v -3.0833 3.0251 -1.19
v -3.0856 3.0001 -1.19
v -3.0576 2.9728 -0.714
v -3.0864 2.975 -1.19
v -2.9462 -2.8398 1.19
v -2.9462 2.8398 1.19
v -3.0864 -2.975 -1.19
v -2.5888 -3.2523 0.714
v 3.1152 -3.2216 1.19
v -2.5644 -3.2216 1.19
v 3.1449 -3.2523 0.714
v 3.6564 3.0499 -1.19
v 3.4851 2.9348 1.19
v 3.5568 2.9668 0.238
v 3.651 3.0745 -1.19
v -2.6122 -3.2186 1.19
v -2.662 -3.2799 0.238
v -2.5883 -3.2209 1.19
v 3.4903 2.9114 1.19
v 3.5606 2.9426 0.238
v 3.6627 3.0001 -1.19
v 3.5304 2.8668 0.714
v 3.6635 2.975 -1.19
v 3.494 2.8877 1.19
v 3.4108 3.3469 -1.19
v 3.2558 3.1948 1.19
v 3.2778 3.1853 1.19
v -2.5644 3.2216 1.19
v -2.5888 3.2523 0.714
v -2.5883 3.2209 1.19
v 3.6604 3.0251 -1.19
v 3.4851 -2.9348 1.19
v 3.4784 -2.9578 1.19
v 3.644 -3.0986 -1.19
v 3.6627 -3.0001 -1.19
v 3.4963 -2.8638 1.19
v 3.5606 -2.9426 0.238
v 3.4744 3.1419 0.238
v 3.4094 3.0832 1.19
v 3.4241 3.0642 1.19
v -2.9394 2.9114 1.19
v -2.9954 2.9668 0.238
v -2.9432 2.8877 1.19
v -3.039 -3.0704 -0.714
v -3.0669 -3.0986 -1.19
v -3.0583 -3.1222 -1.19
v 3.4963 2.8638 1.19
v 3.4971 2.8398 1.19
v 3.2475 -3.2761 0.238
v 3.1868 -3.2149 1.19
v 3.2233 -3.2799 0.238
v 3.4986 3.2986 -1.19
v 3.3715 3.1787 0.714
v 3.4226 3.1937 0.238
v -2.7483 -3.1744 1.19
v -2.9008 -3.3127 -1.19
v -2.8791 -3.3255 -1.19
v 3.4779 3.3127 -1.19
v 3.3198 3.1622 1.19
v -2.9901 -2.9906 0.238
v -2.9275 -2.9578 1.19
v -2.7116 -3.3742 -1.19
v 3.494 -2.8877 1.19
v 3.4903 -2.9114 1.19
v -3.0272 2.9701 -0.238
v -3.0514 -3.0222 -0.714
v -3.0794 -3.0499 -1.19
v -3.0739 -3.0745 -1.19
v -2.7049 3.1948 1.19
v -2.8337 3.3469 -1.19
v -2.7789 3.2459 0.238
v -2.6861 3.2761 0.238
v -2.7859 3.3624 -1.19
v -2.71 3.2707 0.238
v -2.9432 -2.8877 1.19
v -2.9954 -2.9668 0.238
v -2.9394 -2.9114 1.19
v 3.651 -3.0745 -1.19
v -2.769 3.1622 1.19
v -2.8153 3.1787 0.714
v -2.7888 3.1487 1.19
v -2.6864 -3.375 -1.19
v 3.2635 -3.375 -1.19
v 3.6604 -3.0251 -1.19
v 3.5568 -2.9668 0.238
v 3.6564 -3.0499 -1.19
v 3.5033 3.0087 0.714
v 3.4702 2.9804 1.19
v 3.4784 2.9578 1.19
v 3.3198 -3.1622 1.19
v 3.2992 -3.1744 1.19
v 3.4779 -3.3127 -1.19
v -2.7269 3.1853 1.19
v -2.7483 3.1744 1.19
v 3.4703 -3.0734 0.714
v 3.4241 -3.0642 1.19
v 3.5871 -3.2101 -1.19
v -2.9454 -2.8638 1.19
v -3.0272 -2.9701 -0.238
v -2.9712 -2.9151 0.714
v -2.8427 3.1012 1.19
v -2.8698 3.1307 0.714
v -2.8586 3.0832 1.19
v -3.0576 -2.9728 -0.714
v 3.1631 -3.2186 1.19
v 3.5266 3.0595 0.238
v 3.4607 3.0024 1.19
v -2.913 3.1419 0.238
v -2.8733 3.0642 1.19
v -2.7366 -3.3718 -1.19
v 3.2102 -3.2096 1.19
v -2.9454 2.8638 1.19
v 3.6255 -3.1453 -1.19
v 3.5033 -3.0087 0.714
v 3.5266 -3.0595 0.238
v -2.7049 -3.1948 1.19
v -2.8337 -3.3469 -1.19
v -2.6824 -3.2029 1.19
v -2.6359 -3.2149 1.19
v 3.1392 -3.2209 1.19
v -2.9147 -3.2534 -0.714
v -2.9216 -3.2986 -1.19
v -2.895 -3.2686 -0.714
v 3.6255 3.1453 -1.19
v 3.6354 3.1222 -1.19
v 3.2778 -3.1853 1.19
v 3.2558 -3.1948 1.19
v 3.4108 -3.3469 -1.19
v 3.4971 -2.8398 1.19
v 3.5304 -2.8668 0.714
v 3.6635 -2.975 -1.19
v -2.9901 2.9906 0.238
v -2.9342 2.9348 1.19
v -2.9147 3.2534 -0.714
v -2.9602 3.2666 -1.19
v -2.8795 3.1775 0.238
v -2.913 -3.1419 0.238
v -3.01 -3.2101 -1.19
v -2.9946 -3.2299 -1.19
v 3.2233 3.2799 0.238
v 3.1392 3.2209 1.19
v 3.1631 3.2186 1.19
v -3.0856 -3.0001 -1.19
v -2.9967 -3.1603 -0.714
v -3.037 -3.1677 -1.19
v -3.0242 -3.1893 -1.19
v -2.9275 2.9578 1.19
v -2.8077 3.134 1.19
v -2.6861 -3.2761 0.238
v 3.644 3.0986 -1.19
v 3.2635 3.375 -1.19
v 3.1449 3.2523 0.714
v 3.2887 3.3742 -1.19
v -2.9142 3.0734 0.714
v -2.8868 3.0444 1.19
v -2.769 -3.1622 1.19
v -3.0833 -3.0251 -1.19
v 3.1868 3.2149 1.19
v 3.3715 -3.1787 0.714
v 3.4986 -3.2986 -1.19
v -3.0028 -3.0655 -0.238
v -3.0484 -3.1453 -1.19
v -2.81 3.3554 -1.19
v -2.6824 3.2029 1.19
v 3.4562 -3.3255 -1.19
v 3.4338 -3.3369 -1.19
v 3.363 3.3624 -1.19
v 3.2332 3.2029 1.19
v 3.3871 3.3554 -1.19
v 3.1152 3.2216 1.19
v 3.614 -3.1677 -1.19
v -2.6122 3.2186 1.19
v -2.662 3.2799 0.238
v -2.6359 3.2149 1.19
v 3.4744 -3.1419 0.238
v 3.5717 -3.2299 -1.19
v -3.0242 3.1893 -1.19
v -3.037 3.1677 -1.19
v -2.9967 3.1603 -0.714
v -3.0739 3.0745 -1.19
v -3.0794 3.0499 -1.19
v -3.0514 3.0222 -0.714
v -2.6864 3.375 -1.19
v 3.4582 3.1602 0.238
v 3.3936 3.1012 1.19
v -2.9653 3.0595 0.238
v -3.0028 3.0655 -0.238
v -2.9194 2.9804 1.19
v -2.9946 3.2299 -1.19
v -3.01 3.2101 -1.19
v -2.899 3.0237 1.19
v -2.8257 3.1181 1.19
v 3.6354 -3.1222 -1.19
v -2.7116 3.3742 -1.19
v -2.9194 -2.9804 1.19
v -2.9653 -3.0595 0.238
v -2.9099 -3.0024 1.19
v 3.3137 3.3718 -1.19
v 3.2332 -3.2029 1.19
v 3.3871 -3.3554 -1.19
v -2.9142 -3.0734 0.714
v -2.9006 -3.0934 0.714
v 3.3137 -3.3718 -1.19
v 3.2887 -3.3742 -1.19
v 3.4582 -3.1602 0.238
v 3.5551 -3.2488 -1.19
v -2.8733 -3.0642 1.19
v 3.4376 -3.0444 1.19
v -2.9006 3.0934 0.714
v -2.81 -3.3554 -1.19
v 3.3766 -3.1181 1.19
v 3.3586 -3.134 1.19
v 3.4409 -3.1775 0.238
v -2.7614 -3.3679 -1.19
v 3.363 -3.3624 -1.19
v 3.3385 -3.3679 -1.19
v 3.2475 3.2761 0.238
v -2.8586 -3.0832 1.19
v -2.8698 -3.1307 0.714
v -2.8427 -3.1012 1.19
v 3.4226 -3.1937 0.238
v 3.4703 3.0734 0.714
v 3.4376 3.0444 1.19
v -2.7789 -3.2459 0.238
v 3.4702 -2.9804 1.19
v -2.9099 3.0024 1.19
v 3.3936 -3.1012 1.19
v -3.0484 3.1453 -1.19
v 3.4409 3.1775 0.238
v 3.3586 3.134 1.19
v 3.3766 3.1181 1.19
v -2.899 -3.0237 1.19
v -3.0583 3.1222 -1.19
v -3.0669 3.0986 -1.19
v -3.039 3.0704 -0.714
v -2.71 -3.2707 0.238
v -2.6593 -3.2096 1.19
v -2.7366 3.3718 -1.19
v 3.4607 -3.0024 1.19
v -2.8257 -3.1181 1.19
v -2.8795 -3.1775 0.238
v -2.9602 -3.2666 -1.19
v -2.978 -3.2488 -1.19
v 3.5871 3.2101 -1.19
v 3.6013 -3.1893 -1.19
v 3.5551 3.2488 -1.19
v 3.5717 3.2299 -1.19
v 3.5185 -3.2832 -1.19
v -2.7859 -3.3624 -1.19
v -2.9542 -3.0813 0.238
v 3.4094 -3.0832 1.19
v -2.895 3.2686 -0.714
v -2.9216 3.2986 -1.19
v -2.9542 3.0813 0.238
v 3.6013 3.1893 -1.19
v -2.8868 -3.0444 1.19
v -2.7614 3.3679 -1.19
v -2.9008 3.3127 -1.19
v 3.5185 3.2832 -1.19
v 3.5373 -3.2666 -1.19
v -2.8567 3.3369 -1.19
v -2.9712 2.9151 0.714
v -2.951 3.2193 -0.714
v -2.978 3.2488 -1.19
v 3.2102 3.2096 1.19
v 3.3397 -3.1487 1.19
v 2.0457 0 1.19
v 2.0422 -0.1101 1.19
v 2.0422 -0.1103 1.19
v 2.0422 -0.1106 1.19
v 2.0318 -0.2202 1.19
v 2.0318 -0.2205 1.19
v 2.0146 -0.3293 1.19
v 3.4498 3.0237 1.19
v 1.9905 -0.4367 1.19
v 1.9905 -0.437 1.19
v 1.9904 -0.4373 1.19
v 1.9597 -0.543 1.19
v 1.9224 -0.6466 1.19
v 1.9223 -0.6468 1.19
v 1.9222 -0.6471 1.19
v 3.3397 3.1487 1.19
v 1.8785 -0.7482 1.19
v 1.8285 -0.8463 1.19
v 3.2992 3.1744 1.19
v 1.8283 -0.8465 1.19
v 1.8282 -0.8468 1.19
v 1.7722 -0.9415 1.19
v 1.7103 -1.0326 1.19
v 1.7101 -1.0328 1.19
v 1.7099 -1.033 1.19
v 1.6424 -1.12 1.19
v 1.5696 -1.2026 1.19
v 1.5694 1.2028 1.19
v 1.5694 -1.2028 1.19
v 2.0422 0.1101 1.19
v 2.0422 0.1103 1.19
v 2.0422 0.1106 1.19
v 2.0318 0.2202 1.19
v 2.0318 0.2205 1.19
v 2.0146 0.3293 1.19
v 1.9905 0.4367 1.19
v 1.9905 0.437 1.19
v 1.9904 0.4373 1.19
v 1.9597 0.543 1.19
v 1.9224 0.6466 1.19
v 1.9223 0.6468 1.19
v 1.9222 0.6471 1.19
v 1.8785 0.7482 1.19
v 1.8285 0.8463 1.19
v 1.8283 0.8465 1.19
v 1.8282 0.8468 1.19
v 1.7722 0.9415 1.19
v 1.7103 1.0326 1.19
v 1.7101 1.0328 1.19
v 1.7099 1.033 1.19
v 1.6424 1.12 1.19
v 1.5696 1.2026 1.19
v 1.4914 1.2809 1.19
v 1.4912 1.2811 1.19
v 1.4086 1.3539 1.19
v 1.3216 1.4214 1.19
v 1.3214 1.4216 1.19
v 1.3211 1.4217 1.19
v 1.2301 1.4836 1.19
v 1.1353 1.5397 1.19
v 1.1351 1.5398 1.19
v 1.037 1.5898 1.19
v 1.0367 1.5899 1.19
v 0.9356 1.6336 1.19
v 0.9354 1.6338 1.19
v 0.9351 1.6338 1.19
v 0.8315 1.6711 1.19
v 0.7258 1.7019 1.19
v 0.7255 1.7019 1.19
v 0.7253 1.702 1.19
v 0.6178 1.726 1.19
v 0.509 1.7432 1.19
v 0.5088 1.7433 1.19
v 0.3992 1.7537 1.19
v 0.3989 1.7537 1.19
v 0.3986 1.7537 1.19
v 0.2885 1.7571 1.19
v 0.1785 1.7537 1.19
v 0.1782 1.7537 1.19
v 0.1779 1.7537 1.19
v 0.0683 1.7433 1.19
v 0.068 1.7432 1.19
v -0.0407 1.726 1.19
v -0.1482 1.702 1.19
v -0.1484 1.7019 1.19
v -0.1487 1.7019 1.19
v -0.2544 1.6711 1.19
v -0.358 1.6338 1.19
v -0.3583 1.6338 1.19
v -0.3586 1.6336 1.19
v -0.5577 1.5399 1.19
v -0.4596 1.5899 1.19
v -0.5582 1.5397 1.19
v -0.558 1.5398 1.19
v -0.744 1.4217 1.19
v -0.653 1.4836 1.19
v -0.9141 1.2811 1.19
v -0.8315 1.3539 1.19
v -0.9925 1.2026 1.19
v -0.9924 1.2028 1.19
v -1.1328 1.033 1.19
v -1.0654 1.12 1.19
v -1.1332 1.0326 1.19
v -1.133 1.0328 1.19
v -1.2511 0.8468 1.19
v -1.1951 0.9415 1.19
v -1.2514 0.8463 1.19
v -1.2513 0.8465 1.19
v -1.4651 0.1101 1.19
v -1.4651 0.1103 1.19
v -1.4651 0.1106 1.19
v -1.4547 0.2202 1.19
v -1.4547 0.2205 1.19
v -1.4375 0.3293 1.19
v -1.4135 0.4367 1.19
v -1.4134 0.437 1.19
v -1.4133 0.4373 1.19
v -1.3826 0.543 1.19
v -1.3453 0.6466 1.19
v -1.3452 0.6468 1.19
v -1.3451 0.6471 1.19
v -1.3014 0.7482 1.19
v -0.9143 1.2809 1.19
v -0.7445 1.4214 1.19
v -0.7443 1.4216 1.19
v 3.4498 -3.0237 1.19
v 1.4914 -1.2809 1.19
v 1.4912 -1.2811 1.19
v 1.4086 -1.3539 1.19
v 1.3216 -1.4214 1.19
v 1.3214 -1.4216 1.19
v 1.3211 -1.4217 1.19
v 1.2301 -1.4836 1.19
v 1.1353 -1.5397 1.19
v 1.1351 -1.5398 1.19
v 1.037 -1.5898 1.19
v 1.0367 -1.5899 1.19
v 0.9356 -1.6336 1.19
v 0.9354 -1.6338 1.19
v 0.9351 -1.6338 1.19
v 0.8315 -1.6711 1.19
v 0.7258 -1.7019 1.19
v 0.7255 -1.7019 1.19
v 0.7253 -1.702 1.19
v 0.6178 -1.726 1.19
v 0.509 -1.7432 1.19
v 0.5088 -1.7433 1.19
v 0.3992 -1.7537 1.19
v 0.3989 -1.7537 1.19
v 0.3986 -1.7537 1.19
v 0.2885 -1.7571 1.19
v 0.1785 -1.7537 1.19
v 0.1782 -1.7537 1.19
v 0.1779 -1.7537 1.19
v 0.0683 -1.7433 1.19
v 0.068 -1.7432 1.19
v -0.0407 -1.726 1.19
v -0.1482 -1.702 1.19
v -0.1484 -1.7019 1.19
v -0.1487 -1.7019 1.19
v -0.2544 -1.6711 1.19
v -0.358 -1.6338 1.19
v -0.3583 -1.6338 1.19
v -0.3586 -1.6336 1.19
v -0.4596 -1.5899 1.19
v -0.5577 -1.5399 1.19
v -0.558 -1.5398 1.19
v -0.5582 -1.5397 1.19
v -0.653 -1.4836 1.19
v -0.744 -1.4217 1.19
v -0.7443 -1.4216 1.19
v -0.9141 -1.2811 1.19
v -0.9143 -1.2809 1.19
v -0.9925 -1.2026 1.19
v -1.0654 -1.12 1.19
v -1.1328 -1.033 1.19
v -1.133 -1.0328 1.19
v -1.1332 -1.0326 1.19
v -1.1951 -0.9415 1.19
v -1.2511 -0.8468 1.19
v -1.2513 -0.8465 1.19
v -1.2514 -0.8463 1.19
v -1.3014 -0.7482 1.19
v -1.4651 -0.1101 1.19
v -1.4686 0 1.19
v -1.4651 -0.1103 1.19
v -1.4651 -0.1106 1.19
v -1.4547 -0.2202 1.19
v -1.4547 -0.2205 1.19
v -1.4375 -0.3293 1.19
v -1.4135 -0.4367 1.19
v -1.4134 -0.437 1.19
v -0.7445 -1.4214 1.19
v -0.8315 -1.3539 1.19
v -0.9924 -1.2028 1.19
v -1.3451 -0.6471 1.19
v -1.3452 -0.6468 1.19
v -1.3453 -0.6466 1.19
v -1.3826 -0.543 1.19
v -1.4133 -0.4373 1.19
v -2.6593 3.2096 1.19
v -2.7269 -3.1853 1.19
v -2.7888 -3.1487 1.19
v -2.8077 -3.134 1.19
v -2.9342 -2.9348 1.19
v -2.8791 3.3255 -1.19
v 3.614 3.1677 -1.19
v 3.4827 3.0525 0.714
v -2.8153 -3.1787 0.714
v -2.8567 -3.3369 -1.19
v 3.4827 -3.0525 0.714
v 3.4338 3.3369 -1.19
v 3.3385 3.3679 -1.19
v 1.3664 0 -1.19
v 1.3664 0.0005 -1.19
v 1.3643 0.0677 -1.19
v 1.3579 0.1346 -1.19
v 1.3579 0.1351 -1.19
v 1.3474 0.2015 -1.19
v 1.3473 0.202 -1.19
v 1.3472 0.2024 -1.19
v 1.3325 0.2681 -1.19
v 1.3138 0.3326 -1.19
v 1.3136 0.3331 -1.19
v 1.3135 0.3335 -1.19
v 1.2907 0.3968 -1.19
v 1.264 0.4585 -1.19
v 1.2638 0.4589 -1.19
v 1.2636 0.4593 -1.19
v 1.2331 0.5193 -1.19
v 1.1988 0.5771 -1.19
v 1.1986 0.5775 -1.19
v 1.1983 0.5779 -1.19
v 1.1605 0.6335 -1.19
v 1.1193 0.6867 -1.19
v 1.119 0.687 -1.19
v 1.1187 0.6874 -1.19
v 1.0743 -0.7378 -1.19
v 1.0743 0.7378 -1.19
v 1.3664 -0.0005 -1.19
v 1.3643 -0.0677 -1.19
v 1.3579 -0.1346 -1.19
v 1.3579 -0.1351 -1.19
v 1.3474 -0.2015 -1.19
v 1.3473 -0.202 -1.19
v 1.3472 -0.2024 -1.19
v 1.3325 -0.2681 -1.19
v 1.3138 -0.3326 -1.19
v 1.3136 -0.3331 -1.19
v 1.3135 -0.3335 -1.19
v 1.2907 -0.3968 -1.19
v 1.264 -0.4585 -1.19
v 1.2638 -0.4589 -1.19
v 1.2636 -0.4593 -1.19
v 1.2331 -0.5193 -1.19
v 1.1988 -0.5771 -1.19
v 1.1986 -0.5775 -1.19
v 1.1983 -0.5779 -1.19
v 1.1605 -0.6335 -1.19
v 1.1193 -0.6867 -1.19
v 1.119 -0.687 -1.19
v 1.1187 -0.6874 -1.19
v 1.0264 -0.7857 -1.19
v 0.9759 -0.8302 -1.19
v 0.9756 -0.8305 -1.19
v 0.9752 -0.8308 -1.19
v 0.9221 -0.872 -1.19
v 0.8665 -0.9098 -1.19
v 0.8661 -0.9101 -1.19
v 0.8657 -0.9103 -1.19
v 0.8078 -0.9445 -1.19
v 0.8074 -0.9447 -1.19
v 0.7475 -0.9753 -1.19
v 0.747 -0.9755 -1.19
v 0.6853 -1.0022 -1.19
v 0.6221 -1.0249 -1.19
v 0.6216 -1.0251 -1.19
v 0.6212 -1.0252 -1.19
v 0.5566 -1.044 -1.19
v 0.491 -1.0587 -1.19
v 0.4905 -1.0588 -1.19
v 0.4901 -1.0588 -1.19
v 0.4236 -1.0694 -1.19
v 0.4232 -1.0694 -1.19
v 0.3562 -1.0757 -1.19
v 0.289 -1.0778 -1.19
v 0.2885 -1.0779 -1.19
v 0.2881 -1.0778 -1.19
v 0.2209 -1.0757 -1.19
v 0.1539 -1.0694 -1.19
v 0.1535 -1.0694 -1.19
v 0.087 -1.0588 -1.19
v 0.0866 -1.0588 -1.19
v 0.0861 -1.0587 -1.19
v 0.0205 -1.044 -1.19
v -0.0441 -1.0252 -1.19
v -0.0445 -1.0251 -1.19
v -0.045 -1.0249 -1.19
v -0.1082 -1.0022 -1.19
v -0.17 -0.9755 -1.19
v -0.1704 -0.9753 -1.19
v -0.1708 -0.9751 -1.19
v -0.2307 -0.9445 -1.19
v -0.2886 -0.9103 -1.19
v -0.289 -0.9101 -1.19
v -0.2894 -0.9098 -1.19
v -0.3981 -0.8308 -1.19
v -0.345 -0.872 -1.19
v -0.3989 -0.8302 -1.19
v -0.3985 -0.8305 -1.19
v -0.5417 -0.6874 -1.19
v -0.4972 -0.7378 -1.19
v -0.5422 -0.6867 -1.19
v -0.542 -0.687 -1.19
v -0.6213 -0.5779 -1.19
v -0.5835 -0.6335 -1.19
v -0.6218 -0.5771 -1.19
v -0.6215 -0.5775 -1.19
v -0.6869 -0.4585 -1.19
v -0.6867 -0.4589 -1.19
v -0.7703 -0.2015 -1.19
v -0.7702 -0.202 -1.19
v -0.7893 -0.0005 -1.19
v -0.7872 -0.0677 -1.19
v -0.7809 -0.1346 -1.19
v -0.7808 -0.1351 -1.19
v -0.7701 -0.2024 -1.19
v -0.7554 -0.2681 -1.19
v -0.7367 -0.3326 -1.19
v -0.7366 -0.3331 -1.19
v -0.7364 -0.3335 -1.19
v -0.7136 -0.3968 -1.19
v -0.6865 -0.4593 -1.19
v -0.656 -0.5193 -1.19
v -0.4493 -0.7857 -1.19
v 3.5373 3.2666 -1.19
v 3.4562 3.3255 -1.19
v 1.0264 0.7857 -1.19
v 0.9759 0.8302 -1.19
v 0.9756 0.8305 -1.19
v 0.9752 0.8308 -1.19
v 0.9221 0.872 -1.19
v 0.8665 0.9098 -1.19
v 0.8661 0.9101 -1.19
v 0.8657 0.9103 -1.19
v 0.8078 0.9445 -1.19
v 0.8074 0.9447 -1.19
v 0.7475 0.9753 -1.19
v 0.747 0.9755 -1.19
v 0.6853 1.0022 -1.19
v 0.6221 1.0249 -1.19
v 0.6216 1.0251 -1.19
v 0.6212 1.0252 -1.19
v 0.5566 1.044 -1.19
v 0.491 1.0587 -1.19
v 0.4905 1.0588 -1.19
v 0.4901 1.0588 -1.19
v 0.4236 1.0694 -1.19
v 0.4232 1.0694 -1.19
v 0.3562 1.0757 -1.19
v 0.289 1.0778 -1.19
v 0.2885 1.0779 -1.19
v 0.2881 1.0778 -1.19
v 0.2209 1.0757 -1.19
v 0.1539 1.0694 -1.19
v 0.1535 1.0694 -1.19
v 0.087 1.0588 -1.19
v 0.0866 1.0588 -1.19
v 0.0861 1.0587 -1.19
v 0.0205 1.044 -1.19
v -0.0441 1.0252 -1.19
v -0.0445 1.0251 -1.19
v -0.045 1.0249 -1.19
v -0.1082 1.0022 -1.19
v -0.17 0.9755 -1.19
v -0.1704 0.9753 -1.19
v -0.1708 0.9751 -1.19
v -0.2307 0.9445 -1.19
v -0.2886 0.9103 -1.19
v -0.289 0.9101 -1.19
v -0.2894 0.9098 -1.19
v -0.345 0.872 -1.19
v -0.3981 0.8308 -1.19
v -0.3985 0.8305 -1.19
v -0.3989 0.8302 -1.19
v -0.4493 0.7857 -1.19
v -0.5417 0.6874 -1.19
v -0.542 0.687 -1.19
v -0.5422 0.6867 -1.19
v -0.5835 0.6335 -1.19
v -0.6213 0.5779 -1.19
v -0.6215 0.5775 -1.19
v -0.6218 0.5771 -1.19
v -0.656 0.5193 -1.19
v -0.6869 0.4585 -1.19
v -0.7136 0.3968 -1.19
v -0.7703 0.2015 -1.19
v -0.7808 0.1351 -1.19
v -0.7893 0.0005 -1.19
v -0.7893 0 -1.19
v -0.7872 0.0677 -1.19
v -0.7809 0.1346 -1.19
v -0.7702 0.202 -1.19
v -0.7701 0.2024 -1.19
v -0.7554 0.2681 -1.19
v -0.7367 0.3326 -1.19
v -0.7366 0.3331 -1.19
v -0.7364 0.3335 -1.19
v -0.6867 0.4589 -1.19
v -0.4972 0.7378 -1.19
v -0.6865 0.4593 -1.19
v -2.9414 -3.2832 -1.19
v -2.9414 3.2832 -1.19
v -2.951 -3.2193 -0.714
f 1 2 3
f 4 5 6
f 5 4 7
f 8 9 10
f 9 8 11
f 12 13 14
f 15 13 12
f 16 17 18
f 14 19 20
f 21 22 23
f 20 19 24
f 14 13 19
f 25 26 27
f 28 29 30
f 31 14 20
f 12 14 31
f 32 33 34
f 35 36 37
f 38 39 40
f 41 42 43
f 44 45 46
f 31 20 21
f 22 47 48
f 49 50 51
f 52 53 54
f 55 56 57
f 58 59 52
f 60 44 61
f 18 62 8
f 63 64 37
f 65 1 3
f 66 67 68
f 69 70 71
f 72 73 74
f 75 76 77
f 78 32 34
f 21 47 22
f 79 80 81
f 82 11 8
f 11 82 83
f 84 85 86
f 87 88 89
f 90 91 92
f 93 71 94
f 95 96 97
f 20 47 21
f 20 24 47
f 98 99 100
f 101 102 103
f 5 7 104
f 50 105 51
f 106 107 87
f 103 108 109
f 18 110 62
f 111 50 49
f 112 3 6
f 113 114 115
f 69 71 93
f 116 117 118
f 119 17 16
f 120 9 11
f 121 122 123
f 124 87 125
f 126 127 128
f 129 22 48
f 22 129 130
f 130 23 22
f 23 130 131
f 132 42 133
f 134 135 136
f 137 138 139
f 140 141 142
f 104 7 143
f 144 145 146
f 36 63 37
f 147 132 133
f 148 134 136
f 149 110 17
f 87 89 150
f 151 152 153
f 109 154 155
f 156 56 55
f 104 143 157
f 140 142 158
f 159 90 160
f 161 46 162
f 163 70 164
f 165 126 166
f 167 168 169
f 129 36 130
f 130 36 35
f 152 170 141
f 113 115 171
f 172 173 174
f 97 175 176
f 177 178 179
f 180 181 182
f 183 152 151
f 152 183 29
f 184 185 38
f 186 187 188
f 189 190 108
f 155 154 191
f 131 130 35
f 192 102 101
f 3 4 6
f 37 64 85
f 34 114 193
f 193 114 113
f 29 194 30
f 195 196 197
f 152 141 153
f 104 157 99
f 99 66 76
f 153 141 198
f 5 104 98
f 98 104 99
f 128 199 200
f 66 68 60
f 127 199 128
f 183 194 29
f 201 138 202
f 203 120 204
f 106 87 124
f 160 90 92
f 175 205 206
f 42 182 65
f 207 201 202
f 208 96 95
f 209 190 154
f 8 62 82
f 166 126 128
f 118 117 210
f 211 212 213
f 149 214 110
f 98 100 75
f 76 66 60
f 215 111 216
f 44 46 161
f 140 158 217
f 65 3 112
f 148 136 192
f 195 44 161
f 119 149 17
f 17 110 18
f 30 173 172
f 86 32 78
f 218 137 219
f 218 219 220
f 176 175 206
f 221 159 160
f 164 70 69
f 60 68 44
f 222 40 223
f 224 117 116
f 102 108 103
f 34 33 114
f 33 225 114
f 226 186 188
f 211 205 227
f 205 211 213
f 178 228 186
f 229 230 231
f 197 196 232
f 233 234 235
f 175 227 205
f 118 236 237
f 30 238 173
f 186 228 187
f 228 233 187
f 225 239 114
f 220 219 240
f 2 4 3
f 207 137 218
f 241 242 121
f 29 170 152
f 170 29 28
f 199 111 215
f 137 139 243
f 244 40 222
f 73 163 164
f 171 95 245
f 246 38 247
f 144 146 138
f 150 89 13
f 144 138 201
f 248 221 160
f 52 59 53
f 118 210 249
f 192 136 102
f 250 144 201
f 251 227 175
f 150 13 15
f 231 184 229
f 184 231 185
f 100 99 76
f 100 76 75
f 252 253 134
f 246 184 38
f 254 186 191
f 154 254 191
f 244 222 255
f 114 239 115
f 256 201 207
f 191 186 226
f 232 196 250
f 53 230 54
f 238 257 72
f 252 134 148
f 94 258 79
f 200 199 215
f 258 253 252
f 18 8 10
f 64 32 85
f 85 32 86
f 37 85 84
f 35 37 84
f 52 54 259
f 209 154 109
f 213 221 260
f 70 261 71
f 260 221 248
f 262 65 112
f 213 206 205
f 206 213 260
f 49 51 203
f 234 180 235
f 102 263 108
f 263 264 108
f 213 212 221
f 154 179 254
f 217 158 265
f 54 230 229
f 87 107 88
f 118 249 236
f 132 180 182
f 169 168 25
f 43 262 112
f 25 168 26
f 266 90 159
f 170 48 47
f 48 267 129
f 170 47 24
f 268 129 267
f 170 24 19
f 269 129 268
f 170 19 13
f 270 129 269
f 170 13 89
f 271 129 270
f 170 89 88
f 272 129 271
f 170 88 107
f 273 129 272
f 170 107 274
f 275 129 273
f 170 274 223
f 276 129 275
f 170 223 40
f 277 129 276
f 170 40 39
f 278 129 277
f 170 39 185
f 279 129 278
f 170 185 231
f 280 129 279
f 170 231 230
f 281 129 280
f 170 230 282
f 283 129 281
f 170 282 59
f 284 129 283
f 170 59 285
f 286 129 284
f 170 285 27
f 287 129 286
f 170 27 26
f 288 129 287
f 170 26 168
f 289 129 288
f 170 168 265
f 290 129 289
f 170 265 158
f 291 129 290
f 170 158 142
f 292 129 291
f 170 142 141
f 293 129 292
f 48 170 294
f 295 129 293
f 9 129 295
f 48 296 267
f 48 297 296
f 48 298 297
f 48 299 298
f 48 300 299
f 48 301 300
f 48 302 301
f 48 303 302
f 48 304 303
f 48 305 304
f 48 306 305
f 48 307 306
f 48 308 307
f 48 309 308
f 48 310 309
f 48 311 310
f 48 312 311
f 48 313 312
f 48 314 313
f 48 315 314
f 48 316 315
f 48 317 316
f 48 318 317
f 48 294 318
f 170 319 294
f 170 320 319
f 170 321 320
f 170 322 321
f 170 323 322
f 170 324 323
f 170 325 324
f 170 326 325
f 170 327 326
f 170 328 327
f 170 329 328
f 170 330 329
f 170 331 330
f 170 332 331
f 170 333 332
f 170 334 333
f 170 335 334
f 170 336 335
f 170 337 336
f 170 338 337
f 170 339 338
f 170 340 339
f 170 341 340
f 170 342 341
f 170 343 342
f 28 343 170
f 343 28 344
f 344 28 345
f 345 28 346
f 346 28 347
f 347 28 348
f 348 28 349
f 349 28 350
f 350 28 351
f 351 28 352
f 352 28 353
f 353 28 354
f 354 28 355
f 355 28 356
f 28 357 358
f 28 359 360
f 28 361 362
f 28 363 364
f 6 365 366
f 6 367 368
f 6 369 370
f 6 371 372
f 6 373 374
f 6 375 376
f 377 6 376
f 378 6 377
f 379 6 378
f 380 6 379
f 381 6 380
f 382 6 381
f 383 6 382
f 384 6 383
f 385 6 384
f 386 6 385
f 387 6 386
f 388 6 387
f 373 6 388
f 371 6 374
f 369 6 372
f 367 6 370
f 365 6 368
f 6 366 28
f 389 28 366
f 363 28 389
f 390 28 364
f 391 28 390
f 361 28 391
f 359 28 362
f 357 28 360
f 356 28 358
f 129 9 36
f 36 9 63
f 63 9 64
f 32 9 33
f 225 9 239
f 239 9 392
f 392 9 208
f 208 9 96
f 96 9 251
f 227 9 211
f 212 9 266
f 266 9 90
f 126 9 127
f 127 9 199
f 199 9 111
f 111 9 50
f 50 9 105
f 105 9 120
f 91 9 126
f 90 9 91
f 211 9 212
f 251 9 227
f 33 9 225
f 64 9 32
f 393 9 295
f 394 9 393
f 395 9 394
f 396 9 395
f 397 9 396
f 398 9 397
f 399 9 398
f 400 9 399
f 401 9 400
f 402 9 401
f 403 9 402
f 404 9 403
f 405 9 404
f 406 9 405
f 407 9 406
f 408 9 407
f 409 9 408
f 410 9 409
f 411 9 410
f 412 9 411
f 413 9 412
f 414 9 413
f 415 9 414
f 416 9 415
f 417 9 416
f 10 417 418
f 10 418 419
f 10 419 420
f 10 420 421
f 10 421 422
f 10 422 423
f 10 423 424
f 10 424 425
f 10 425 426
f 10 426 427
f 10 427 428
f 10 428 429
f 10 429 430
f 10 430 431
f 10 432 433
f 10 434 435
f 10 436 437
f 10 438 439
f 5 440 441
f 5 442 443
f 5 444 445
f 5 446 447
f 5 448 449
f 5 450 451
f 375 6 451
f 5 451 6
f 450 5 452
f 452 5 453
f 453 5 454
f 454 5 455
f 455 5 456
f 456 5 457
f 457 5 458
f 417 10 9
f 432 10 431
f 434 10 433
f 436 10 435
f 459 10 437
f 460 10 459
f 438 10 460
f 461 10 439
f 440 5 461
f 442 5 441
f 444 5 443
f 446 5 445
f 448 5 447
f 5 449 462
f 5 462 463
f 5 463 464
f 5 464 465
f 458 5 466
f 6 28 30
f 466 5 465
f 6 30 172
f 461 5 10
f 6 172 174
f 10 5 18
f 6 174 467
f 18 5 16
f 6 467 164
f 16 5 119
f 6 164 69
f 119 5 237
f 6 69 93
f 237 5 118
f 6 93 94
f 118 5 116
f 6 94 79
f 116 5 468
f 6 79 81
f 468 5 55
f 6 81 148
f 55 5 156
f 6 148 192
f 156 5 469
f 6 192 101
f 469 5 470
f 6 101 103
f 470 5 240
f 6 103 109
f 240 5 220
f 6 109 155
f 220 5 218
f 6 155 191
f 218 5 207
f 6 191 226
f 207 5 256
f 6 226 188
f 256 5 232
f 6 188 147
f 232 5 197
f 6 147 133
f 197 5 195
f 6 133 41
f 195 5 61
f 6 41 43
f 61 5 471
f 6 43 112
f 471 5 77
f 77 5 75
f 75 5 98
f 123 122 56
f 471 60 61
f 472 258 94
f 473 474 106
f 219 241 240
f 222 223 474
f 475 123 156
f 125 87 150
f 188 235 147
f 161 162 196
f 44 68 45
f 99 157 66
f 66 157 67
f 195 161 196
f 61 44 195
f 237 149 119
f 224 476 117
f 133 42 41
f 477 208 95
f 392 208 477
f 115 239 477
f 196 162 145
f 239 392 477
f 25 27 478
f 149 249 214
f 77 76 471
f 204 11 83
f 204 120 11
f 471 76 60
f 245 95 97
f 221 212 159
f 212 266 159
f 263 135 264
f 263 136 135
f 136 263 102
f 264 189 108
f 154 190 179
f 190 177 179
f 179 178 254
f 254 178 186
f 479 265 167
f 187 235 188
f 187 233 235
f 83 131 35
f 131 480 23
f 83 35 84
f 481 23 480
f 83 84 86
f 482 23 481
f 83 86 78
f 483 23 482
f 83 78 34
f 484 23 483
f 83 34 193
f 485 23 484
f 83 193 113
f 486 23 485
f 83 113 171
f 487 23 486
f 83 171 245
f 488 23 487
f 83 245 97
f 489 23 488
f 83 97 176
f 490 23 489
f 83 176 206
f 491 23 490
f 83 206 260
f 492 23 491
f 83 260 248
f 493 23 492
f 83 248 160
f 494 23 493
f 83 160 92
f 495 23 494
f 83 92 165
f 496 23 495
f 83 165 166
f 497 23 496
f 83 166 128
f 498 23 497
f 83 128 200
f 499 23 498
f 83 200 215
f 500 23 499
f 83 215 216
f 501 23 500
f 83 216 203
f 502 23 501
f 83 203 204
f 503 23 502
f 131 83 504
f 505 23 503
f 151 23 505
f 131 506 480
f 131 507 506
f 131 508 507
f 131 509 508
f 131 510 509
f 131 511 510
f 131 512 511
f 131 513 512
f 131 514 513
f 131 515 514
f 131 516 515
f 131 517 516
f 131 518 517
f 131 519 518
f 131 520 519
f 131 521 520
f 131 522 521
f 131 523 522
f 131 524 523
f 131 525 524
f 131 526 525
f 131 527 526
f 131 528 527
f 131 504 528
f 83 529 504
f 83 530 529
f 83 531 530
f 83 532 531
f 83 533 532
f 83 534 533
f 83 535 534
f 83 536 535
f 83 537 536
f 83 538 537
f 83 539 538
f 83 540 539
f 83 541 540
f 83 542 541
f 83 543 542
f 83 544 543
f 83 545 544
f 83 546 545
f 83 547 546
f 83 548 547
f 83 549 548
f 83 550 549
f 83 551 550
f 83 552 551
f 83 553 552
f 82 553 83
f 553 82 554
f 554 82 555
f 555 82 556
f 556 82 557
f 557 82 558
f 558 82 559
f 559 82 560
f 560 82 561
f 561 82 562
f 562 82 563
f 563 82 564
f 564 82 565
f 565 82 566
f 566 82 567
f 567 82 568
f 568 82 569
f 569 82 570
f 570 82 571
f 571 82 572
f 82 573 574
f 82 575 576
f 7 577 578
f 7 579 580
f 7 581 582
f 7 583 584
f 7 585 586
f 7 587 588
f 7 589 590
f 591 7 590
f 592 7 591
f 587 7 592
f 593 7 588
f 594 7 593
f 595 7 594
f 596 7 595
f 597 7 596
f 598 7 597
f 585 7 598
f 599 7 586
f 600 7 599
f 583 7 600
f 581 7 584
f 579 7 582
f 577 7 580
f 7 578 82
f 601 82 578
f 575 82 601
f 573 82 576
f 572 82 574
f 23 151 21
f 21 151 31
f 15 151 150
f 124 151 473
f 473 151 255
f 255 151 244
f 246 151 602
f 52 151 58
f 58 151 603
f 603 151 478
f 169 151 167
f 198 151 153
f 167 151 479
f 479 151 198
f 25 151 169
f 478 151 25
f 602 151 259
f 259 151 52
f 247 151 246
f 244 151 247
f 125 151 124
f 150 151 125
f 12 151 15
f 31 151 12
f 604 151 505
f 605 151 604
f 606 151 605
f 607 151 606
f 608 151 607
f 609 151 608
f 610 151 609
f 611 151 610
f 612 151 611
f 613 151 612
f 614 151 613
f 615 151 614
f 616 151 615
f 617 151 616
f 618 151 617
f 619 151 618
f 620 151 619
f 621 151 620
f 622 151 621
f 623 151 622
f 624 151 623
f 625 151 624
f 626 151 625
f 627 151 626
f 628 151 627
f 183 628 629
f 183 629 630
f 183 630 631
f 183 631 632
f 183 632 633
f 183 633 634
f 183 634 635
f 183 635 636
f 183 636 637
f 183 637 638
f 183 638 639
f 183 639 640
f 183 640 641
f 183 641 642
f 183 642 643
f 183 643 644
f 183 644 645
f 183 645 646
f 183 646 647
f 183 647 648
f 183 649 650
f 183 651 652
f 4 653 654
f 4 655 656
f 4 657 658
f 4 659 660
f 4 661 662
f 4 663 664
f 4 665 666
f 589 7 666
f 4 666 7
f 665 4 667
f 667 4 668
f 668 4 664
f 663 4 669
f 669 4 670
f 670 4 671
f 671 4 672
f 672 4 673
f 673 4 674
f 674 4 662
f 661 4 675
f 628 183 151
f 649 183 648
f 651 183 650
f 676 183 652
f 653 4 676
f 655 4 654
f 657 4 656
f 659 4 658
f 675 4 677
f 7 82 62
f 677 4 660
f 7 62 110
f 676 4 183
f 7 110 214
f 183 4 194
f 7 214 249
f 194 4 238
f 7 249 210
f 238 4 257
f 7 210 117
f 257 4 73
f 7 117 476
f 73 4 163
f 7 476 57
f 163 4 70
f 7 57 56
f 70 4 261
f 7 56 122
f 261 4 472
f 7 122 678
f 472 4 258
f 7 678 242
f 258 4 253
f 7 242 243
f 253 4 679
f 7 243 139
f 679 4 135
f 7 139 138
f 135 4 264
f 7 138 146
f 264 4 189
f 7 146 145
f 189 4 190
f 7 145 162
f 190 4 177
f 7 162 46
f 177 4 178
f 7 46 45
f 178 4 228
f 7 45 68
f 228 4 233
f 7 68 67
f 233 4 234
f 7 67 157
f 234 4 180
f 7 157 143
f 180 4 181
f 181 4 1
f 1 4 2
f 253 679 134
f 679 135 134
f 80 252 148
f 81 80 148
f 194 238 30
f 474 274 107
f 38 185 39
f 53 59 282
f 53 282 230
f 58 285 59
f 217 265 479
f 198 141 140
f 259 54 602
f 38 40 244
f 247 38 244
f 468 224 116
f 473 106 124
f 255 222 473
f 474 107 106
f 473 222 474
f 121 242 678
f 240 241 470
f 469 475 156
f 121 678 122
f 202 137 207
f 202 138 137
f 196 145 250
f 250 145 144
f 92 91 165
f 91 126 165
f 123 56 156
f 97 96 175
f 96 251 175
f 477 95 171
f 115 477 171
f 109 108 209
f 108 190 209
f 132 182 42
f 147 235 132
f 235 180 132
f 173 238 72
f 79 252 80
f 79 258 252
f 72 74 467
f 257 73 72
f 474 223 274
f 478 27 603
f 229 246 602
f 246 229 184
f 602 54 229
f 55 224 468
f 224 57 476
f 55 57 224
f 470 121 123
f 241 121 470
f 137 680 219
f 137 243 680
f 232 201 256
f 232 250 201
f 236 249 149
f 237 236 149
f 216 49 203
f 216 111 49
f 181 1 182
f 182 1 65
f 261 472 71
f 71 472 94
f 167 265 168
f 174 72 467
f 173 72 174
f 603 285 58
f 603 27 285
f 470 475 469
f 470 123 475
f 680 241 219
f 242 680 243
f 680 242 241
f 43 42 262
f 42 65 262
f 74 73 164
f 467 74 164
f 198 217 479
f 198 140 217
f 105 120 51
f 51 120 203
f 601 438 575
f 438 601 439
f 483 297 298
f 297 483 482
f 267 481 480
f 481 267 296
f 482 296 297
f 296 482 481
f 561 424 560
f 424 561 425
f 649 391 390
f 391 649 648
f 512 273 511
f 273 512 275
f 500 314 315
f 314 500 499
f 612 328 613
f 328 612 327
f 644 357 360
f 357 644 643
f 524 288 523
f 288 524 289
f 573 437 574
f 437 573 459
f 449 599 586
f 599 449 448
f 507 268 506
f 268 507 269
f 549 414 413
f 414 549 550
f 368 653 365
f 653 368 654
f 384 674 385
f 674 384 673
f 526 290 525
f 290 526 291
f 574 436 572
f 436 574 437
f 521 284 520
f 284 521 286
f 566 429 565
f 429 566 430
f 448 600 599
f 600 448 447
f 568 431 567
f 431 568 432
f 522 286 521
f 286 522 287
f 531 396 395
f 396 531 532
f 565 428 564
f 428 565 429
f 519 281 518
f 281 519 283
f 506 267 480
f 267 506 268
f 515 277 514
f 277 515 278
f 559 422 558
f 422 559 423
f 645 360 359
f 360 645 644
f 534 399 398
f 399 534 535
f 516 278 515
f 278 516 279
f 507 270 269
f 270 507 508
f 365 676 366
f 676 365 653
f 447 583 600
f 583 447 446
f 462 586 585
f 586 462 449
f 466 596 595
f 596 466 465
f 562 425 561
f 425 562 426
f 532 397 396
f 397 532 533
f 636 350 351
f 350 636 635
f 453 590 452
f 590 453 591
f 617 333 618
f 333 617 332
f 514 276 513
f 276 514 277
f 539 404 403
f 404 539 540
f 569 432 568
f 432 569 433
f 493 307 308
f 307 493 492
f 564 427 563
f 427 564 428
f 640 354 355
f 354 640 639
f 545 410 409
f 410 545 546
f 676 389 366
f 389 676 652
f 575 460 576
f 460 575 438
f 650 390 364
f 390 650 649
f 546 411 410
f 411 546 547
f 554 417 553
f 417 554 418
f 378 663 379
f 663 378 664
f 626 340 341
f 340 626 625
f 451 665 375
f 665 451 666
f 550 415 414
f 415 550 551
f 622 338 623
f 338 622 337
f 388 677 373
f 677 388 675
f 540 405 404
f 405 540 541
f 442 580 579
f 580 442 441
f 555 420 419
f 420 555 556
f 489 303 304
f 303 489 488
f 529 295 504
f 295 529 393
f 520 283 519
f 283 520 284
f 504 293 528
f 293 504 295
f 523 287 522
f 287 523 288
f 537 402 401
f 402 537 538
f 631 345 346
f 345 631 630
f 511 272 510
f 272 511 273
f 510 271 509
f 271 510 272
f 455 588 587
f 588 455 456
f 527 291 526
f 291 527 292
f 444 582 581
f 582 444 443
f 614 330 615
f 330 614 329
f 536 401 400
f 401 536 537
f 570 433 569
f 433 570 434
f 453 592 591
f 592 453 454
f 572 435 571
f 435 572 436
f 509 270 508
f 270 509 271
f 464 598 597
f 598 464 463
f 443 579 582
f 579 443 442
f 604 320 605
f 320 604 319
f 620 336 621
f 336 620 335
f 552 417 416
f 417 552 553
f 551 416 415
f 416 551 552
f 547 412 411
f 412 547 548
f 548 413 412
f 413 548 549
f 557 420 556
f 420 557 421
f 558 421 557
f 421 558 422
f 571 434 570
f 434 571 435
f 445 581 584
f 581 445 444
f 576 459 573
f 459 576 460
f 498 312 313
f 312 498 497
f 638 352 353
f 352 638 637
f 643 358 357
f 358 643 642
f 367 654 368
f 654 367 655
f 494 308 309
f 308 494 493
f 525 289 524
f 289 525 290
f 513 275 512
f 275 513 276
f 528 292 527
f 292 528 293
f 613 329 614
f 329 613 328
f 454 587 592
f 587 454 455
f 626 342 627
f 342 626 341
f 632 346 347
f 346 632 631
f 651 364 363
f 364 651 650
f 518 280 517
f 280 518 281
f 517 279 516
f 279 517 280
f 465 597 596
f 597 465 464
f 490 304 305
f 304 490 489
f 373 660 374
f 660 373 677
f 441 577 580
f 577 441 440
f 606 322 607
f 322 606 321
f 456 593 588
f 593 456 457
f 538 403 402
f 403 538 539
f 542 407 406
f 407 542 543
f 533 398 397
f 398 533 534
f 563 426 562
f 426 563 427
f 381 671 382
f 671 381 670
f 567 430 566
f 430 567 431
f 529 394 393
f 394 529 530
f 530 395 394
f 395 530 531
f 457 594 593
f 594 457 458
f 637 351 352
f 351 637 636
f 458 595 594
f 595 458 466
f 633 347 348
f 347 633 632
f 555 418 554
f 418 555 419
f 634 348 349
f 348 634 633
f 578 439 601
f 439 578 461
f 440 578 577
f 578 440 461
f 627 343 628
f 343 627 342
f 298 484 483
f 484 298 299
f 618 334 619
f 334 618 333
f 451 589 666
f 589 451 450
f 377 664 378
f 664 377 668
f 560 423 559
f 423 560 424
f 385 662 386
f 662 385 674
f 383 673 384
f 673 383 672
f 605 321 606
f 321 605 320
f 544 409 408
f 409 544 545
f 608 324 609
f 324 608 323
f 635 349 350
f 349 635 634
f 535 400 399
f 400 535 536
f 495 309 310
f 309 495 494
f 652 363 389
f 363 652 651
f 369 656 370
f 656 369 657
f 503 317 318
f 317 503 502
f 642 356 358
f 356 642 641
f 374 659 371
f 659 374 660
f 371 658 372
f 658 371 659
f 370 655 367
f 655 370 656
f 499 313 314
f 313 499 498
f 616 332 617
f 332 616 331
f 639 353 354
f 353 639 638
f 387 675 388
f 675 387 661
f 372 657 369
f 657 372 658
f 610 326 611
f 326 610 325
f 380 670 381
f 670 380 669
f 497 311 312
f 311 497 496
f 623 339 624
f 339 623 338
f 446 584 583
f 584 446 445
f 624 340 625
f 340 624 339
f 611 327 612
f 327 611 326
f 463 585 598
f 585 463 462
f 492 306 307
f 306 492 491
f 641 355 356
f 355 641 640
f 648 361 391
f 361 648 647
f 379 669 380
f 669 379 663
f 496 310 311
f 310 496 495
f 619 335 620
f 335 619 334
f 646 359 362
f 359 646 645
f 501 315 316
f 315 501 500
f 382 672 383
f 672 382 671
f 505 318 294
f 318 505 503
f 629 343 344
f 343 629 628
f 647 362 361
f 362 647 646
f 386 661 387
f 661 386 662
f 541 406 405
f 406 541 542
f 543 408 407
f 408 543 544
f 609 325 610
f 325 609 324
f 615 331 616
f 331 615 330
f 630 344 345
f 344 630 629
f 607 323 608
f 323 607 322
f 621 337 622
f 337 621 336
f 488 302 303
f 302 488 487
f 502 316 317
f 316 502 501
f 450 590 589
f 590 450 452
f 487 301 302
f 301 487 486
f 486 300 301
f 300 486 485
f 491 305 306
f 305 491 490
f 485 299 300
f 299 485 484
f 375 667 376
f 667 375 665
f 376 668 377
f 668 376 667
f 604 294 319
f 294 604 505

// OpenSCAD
//Turning Insert Identification code
//CCMT060204 
//C - 80deg diamond shape
//c - relief angle 7deg
//m - tolerance +/-.002
//06 - cutting edge length 6.35mm or 1/4"
//02 - insert thickness 2.38mm
//04 - nose,edge radius 0.4mm
//hole is either a #3-48 or M2.5x0.45, which are roughly equivelent 2.5146mm vs 2.5mm

//square

difference(){
 linear_extrude(height = 2.38, center = true, convexity = 10, scale=(6.35-2.35*tan(7))/6.35, slices = 5, $fn = 100)
 translate([2.35*tan(7), 0, 0])
    minkowski(){
        //difference(){
            square(size = 6.35-0.4, center = true);
            //circle(r=2.15/2);
        //}
        circle(r=0.4);
    }
    translate([2.35*tan(7), 0, 0])
    cylinder(r1 = 2.15/2,r2=3.52/2,h=2.4,center=true, $fn = 100);
}
